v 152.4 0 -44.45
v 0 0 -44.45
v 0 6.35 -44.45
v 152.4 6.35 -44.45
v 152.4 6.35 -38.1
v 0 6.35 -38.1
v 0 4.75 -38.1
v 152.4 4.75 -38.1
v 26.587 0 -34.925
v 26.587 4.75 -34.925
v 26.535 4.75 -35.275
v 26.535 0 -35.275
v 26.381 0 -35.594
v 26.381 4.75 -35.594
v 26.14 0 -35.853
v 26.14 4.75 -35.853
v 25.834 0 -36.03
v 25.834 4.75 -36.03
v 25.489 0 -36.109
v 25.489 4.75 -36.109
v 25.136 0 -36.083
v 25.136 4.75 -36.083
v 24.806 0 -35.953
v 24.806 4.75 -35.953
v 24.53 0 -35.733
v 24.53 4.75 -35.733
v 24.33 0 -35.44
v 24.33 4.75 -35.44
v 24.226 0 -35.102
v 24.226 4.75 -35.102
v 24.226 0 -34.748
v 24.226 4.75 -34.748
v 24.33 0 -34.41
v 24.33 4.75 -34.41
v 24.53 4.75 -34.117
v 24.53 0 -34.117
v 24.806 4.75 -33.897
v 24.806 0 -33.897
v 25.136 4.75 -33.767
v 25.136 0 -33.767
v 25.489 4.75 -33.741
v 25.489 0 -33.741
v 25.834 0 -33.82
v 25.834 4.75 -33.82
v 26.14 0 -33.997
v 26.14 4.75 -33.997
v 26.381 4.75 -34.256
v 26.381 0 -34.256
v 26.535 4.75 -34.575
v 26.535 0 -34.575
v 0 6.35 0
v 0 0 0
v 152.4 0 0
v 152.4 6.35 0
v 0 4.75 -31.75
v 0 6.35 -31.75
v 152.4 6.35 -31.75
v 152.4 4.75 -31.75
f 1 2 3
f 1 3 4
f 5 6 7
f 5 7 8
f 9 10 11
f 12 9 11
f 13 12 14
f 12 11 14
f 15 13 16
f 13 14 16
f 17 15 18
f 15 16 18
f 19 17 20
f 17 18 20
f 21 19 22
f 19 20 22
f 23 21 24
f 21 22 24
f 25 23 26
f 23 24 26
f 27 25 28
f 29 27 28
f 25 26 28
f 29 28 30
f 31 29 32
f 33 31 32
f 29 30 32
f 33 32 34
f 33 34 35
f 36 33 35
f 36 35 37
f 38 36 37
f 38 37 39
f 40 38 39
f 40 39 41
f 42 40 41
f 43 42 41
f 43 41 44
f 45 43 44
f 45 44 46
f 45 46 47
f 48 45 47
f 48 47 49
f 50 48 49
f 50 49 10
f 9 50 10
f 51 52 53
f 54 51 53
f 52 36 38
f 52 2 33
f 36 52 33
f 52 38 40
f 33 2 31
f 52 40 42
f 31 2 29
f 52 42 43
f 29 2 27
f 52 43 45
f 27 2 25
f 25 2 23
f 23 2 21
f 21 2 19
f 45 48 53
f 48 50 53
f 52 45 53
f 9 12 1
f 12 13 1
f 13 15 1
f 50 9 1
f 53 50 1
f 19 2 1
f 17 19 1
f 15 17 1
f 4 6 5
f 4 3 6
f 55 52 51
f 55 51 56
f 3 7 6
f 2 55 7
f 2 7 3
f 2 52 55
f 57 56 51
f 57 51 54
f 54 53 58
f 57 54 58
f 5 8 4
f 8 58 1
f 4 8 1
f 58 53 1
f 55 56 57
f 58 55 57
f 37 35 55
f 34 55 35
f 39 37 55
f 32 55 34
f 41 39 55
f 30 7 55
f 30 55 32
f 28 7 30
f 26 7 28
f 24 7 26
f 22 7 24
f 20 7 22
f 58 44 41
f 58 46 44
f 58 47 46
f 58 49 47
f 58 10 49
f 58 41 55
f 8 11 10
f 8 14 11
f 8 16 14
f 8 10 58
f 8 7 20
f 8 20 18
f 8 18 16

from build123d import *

# Parameters (mm, degrees)
SKETCH1_W           = 152.4
SKETCH1_H           = 44.45
BOSS_EXTRUDE1_DEPTH = 6.35
SKETCH2_W           = 146.05
SKETCH2_H           = 6.35
CUT_EXTRUDE1_DEPTH  = 1.6002
SKETCH3_R           = 1.18745
CUT_EXTRUDE2_DEPTH  = 5.7498
SKETCH4_W           = 6.35
SKETCH4_H           = 6.35
CUT_EXTRUDE3_DEPTH  = 1.6002


with BuildPart() as part:
    # Sketch1 → Boss-Extrude1 (new body)
    with BuildSketch(Plane(origin=(0, 0, 0), x_dir=(1, 0, 0), z_dir=(0, 1, 0))):
        with Locations((76.2, 22.225)):
            Rectangle(SKETCH1_W, SKETCH1_H)
    extrude(amount=BOSS_EXTRUDE1_DEPTH)

    # Sketch2 → Cut-Extrude1 (cut)
    with BuildSketch(Plane(origin=(0, 6.35, 0), x_dir=(1, 0, 0), z_dir=(0, 1, 0))):
        with Locations((73.025, 34.925)):
            Rectangle(SKETCH2_W, SKETCH2_H)
    extrude(amount=-CUT_EXTRUDE1_DEPTH, mode=Mode.SUBTRACT)

    # Sketch3 → Cut-Extrude2 (cut, through all)
    with BuildSketch(Plane(origin=(0, 4.7498, 0), x_dir=(1, 0, 0), z_dir=(0, 1, 0))):
        with Locations((25.4, 34.925)):
            Circle(SKETCH3_R)
    extrude(amount=-CUT_EXTRUDE2_DEPTH, mode=Mode.SUBTRACT)

    # Sketch4 → Cut-Extrude3 (cut)
    with BuildSketch(Plane(origin=(0, 6.35, 0), x_dir=(1, 0, 0), z_dir=(0, 1, 0))):
        with Locations((149.225, 34.925)):
            Rectangle(SKETCH4_W, SKETCH4_H)
    extrude(amount=-CUT_EXTRUDE3_DEPTH, mode=Mode.SUBTRACT)


solid = part.part
